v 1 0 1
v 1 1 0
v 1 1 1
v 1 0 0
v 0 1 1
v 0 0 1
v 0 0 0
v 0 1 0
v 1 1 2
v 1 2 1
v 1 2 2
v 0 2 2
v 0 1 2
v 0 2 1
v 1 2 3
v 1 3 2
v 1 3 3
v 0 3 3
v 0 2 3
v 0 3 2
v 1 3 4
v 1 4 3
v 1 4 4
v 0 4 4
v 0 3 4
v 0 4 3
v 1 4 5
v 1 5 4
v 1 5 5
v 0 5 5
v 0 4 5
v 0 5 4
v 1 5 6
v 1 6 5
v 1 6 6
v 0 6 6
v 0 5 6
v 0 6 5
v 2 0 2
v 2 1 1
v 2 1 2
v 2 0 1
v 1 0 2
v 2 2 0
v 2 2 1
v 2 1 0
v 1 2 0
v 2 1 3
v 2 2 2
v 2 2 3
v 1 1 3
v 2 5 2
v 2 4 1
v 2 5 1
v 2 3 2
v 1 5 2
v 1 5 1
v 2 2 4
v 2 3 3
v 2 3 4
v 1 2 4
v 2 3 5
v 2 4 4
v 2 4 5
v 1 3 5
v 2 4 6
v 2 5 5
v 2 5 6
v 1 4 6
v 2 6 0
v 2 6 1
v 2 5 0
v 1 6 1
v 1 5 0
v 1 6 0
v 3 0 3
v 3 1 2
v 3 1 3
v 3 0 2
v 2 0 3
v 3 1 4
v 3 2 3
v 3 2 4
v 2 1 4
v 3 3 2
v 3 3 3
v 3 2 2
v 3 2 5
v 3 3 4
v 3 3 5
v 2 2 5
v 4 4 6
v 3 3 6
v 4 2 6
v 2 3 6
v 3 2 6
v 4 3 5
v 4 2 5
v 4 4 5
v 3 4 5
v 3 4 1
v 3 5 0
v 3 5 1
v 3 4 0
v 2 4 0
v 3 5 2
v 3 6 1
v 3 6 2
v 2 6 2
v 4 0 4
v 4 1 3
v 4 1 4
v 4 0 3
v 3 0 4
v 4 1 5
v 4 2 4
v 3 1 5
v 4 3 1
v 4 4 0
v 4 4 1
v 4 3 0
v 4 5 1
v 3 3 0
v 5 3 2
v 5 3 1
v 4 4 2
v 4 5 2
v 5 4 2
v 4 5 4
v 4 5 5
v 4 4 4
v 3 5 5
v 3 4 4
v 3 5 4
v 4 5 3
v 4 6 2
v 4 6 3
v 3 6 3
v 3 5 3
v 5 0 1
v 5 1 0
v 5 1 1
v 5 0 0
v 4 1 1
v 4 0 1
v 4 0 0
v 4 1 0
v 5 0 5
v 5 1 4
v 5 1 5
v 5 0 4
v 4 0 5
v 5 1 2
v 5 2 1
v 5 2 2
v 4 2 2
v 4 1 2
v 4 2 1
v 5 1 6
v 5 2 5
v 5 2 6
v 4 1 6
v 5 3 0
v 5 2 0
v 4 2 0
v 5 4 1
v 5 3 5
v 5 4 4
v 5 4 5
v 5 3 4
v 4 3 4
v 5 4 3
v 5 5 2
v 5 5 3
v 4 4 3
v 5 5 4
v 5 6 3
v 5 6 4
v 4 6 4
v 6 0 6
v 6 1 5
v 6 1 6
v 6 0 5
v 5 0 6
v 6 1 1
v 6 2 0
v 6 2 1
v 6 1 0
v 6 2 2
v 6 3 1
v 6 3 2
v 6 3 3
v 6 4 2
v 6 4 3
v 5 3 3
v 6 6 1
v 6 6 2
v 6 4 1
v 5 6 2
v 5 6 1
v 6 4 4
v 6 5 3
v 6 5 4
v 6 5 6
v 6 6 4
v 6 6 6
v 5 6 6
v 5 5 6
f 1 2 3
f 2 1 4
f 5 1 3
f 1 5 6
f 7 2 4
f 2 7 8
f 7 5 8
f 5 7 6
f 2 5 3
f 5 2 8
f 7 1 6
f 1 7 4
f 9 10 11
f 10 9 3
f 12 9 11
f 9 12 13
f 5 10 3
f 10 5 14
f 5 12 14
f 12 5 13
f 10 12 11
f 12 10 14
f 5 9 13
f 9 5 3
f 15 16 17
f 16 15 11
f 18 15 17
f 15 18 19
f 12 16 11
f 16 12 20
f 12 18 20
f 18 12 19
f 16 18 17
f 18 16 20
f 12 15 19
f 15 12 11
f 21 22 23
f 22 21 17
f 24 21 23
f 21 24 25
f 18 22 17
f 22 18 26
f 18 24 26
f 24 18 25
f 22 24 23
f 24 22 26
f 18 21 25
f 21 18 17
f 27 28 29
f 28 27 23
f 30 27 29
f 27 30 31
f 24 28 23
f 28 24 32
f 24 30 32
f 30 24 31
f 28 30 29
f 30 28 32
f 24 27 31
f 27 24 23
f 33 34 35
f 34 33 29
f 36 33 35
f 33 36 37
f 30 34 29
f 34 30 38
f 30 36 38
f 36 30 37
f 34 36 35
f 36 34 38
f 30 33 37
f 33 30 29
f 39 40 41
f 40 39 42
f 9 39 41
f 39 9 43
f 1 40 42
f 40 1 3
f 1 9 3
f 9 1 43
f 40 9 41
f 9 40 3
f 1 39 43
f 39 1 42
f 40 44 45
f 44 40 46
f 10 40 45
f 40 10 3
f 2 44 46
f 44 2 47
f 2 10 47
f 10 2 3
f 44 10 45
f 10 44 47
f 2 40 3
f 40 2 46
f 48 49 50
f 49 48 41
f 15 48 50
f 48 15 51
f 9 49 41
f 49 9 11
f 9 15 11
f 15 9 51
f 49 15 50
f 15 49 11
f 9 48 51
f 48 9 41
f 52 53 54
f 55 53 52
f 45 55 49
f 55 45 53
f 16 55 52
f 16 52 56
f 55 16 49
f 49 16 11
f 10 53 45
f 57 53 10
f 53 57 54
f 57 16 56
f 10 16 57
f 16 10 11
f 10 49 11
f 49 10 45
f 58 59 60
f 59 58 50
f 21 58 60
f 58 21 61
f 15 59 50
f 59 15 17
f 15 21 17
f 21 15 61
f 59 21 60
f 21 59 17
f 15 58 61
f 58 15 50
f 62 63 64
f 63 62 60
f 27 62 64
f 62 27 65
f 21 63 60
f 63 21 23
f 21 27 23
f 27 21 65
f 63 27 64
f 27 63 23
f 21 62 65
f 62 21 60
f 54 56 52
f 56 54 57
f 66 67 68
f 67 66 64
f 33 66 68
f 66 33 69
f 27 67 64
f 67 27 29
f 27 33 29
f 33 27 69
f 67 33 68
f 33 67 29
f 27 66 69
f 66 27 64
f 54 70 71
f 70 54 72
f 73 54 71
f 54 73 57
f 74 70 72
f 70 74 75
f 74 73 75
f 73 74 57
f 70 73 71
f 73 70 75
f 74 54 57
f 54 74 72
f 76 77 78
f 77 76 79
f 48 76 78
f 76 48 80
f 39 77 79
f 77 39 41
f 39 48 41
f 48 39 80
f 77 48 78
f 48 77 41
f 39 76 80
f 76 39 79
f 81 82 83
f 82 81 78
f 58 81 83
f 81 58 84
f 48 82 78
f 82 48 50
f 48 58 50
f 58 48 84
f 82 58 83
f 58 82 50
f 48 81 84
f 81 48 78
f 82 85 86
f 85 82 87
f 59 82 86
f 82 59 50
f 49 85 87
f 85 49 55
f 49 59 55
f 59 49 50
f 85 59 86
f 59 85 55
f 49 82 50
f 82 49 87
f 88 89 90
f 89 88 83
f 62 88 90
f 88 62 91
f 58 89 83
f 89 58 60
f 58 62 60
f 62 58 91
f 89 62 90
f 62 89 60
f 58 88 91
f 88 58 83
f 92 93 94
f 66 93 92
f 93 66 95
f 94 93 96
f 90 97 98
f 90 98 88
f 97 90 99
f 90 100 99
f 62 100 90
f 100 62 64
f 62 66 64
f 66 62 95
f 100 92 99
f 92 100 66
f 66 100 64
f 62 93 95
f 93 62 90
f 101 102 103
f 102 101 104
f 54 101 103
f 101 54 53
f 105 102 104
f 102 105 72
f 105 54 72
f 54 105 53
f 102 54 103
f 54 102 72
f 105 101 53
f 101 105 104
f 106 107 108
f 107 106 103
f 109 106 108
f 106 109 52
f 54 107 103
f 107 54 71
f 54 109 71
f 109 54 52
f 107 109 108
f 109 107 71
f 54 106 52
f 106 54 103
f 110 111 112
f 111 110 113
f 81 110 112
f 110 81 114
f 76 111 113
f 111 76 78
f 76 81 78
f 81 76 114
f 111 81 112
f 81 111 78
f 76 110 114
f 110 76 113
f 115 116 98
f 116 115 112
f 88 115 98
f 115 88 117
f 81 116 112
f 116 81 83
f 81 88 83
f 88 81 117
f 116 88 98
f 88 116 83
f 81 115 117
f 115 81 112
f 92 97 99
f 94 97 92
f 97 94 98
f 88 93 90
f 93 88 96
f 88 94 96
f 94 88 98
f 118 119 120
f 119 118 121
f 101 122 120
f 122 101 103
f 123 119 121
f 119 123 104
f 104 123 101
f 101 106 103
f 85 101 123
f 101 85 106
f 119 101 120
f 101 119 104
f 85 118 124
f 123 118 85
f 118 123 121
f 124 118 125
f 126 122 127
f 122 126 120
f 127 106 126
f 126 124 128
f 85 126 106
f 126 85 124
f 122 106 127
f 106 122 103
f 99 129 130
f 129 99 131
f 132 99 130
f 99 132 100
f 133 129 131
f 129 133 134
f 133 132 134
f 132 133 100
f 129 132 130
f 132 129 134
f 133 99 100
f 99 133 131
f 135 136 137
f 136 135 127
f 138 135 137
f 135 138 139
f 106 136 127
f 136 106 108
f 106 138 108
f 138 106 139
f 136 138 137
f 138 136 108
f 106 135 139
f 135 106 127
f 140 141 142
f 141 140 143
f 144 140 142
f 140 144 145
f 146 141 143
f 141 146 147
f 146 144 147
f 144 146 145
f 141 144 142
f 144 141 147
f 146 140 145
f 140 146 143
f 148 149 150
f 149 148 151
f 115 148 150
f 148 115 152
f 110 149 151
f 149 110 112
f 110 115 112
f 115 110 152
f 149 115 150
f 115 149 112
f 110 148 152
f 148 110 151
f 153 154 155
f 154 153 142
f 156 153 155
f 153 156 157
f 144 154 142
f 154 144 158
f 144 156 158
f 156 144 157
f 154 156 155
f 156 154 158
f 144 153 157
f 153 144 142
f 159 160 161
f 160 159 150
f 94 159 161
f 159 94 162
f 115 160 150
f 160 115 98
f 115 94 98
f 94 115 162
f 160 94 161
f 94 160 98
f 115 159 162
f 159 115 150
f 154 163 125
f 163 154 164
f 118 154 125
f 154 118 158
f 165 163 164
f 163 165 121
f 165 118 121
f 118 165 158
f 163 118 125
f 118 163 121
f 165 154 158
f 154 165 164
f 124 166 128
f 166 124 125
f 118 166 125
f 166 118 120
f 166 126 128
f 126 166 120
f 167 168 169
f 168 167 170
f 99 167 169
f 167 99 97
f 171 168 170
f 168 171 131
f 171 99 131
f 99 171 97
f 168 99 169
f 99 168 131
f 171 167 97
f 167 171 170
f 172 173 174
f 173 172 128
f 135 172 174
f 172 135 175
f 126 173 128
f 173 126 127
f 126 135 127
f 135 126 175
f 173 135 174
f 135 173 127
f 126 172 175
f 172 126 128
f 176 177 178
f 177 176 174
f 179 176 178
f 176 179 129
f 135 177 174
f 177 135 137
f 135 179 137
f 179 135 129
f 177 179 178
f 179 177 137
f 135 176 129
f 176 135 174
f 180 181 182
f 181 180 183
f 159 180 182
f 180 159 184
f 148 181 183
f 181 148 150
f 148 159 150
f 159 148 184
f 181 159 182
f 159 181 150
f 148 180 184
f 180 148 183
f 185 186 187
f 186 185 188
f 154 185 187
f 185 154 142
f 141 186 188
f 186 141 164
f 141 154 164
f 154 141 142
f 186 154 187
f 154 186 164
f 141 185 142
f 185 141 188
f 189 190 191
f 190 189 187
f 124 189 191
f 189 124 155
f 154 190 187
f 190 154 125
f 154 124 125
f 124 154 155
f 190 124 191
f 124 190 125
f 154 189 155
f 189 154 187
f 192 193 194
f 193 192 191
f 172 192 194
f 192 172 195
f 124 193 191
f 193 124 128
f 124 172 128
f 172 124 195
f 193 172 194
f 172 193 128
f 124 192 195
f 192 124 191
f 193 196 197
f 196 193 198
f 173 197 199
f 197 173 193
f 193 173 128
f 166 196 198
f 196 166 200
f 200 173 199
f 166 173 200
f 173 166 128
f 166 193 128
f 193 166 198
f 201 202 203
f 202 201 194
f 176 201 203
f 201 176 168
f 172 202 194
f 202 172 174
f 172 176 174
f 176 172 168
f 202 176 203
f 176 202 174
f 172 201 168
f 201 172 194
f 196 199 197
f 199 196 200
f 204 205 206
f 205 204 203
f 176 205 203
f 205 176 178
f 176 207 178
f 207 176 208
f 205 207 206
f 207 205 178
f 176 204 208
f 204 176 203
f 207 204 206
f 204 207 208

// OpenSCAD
union() {
    translate([0, 0, 0]) cube([1, 1, 1]);
    translate([0, 1, 1]) cube([1, 1, 1]);
    translate([0, 2, 2]) cube([1, 1, 1]);
    translate([0, 3, 3]) cube([1, 1, 1]);
    translate([0, 4, 4]) cube([1, 1, 1]);
    translate([0, 5, 5]) cube([1, 1, 1]);
    translate([1, 0, 1]) cube([1, 1, 1]);
    translate([1, 1, 0]) cube([1, 1, 1]);
    translate([1, 1, 2]) cube([1, 1, 1]);
    translate([1, 2, 1]) cube([1, 1, 1]);
    translate([1, 2, 3]) cube([1, 1, 1]);
    translate([1, 3, 1]) cube([1, 1, 1]);
    translate([1, 3, 4]) cube([1, 1, 1]);
    translate([1, 4, 1]) cube([1, 1, 1]);
    translate([1, 4, 5]) cube([1, 1, 1]);
    translate([1, 5, 0]) cube([1, 1, 1]);
    translate([2, 0, 2]) cube([1, 1, 1]);
    translate([2, 1, 3]) cube([1, 1, 1]);
    translate([2, 2, 2]) cube([1, 1, 1]);
    translate([2, 2, 4]) cube([1, 1, 1]);
    translate([2, 3, 5]) cube([1, 1, 1]);
    translate([2, 4, 0]) cube([1, 1, 1]);
    translate([2, 5, 1]) cube([1, 1, 1]);
    translate([3, 0, 3]) cube([1, 1, 1]);
    translate([3, 1, 4]) cube([1, 1, 1]);
    translate([3, 2, 5]) cube([1, 1, 1]);
    translate([3, 3, 0]) cube([1, 1, 1]);
    translate([3, 3, 1]) cube([1, 1, 1]);
    translate([3, 3, 5]) cube([1, 1, 1]);
    translate([3, 4, 1]) cube([1, 1, 1]);
    translate([3, 4, 4]) cube([1, 1, 1]);
    translate([3, 5, 2]) cube([1, 1, 1]);
    translate([4, 0, 0]) cube([1, 1, 1]);
    translate([4, 0, 4]) cube([1, 1, 1]);
    translate([4, 1, 1]) cube([1, 1, 1]);
    translate([4, 1, 5]) cube([1, 1, 1]);
    translate([4, 2, 0]) cube([1, 1, 1]);
    translate([4, 3, 1]) cube([1, 1, 1]);
    translate([4, 3, 4]) cube([1, 1, 1]);
    translate([4, 4, 2]) cube([1, 1, 1]);
    translate([4, 5, 3]) cube([1, 1, 1]);
    translate([5, 0, 5]) cube([1, 1, 1]);
    translate([5, 1, 0]) cube([1, 1, 1]);
    translate([5, 2, 1]) cube([1, 1, 1]);
    translate([5, 3, 2]) cube([1, 1, 1]);
    translate([5, 4, 1]) cube([1, 1, 1]);
    translate([5, 4, 3]) cube([1, 1, 1]);
    translate([5, 5, 1]) cube([1, 1, 1]);
    translate([5, 5, 4]) cube([1, 1, 1]);
    translate([5, 5, 5]) cube([1, 1, 1]);
}
